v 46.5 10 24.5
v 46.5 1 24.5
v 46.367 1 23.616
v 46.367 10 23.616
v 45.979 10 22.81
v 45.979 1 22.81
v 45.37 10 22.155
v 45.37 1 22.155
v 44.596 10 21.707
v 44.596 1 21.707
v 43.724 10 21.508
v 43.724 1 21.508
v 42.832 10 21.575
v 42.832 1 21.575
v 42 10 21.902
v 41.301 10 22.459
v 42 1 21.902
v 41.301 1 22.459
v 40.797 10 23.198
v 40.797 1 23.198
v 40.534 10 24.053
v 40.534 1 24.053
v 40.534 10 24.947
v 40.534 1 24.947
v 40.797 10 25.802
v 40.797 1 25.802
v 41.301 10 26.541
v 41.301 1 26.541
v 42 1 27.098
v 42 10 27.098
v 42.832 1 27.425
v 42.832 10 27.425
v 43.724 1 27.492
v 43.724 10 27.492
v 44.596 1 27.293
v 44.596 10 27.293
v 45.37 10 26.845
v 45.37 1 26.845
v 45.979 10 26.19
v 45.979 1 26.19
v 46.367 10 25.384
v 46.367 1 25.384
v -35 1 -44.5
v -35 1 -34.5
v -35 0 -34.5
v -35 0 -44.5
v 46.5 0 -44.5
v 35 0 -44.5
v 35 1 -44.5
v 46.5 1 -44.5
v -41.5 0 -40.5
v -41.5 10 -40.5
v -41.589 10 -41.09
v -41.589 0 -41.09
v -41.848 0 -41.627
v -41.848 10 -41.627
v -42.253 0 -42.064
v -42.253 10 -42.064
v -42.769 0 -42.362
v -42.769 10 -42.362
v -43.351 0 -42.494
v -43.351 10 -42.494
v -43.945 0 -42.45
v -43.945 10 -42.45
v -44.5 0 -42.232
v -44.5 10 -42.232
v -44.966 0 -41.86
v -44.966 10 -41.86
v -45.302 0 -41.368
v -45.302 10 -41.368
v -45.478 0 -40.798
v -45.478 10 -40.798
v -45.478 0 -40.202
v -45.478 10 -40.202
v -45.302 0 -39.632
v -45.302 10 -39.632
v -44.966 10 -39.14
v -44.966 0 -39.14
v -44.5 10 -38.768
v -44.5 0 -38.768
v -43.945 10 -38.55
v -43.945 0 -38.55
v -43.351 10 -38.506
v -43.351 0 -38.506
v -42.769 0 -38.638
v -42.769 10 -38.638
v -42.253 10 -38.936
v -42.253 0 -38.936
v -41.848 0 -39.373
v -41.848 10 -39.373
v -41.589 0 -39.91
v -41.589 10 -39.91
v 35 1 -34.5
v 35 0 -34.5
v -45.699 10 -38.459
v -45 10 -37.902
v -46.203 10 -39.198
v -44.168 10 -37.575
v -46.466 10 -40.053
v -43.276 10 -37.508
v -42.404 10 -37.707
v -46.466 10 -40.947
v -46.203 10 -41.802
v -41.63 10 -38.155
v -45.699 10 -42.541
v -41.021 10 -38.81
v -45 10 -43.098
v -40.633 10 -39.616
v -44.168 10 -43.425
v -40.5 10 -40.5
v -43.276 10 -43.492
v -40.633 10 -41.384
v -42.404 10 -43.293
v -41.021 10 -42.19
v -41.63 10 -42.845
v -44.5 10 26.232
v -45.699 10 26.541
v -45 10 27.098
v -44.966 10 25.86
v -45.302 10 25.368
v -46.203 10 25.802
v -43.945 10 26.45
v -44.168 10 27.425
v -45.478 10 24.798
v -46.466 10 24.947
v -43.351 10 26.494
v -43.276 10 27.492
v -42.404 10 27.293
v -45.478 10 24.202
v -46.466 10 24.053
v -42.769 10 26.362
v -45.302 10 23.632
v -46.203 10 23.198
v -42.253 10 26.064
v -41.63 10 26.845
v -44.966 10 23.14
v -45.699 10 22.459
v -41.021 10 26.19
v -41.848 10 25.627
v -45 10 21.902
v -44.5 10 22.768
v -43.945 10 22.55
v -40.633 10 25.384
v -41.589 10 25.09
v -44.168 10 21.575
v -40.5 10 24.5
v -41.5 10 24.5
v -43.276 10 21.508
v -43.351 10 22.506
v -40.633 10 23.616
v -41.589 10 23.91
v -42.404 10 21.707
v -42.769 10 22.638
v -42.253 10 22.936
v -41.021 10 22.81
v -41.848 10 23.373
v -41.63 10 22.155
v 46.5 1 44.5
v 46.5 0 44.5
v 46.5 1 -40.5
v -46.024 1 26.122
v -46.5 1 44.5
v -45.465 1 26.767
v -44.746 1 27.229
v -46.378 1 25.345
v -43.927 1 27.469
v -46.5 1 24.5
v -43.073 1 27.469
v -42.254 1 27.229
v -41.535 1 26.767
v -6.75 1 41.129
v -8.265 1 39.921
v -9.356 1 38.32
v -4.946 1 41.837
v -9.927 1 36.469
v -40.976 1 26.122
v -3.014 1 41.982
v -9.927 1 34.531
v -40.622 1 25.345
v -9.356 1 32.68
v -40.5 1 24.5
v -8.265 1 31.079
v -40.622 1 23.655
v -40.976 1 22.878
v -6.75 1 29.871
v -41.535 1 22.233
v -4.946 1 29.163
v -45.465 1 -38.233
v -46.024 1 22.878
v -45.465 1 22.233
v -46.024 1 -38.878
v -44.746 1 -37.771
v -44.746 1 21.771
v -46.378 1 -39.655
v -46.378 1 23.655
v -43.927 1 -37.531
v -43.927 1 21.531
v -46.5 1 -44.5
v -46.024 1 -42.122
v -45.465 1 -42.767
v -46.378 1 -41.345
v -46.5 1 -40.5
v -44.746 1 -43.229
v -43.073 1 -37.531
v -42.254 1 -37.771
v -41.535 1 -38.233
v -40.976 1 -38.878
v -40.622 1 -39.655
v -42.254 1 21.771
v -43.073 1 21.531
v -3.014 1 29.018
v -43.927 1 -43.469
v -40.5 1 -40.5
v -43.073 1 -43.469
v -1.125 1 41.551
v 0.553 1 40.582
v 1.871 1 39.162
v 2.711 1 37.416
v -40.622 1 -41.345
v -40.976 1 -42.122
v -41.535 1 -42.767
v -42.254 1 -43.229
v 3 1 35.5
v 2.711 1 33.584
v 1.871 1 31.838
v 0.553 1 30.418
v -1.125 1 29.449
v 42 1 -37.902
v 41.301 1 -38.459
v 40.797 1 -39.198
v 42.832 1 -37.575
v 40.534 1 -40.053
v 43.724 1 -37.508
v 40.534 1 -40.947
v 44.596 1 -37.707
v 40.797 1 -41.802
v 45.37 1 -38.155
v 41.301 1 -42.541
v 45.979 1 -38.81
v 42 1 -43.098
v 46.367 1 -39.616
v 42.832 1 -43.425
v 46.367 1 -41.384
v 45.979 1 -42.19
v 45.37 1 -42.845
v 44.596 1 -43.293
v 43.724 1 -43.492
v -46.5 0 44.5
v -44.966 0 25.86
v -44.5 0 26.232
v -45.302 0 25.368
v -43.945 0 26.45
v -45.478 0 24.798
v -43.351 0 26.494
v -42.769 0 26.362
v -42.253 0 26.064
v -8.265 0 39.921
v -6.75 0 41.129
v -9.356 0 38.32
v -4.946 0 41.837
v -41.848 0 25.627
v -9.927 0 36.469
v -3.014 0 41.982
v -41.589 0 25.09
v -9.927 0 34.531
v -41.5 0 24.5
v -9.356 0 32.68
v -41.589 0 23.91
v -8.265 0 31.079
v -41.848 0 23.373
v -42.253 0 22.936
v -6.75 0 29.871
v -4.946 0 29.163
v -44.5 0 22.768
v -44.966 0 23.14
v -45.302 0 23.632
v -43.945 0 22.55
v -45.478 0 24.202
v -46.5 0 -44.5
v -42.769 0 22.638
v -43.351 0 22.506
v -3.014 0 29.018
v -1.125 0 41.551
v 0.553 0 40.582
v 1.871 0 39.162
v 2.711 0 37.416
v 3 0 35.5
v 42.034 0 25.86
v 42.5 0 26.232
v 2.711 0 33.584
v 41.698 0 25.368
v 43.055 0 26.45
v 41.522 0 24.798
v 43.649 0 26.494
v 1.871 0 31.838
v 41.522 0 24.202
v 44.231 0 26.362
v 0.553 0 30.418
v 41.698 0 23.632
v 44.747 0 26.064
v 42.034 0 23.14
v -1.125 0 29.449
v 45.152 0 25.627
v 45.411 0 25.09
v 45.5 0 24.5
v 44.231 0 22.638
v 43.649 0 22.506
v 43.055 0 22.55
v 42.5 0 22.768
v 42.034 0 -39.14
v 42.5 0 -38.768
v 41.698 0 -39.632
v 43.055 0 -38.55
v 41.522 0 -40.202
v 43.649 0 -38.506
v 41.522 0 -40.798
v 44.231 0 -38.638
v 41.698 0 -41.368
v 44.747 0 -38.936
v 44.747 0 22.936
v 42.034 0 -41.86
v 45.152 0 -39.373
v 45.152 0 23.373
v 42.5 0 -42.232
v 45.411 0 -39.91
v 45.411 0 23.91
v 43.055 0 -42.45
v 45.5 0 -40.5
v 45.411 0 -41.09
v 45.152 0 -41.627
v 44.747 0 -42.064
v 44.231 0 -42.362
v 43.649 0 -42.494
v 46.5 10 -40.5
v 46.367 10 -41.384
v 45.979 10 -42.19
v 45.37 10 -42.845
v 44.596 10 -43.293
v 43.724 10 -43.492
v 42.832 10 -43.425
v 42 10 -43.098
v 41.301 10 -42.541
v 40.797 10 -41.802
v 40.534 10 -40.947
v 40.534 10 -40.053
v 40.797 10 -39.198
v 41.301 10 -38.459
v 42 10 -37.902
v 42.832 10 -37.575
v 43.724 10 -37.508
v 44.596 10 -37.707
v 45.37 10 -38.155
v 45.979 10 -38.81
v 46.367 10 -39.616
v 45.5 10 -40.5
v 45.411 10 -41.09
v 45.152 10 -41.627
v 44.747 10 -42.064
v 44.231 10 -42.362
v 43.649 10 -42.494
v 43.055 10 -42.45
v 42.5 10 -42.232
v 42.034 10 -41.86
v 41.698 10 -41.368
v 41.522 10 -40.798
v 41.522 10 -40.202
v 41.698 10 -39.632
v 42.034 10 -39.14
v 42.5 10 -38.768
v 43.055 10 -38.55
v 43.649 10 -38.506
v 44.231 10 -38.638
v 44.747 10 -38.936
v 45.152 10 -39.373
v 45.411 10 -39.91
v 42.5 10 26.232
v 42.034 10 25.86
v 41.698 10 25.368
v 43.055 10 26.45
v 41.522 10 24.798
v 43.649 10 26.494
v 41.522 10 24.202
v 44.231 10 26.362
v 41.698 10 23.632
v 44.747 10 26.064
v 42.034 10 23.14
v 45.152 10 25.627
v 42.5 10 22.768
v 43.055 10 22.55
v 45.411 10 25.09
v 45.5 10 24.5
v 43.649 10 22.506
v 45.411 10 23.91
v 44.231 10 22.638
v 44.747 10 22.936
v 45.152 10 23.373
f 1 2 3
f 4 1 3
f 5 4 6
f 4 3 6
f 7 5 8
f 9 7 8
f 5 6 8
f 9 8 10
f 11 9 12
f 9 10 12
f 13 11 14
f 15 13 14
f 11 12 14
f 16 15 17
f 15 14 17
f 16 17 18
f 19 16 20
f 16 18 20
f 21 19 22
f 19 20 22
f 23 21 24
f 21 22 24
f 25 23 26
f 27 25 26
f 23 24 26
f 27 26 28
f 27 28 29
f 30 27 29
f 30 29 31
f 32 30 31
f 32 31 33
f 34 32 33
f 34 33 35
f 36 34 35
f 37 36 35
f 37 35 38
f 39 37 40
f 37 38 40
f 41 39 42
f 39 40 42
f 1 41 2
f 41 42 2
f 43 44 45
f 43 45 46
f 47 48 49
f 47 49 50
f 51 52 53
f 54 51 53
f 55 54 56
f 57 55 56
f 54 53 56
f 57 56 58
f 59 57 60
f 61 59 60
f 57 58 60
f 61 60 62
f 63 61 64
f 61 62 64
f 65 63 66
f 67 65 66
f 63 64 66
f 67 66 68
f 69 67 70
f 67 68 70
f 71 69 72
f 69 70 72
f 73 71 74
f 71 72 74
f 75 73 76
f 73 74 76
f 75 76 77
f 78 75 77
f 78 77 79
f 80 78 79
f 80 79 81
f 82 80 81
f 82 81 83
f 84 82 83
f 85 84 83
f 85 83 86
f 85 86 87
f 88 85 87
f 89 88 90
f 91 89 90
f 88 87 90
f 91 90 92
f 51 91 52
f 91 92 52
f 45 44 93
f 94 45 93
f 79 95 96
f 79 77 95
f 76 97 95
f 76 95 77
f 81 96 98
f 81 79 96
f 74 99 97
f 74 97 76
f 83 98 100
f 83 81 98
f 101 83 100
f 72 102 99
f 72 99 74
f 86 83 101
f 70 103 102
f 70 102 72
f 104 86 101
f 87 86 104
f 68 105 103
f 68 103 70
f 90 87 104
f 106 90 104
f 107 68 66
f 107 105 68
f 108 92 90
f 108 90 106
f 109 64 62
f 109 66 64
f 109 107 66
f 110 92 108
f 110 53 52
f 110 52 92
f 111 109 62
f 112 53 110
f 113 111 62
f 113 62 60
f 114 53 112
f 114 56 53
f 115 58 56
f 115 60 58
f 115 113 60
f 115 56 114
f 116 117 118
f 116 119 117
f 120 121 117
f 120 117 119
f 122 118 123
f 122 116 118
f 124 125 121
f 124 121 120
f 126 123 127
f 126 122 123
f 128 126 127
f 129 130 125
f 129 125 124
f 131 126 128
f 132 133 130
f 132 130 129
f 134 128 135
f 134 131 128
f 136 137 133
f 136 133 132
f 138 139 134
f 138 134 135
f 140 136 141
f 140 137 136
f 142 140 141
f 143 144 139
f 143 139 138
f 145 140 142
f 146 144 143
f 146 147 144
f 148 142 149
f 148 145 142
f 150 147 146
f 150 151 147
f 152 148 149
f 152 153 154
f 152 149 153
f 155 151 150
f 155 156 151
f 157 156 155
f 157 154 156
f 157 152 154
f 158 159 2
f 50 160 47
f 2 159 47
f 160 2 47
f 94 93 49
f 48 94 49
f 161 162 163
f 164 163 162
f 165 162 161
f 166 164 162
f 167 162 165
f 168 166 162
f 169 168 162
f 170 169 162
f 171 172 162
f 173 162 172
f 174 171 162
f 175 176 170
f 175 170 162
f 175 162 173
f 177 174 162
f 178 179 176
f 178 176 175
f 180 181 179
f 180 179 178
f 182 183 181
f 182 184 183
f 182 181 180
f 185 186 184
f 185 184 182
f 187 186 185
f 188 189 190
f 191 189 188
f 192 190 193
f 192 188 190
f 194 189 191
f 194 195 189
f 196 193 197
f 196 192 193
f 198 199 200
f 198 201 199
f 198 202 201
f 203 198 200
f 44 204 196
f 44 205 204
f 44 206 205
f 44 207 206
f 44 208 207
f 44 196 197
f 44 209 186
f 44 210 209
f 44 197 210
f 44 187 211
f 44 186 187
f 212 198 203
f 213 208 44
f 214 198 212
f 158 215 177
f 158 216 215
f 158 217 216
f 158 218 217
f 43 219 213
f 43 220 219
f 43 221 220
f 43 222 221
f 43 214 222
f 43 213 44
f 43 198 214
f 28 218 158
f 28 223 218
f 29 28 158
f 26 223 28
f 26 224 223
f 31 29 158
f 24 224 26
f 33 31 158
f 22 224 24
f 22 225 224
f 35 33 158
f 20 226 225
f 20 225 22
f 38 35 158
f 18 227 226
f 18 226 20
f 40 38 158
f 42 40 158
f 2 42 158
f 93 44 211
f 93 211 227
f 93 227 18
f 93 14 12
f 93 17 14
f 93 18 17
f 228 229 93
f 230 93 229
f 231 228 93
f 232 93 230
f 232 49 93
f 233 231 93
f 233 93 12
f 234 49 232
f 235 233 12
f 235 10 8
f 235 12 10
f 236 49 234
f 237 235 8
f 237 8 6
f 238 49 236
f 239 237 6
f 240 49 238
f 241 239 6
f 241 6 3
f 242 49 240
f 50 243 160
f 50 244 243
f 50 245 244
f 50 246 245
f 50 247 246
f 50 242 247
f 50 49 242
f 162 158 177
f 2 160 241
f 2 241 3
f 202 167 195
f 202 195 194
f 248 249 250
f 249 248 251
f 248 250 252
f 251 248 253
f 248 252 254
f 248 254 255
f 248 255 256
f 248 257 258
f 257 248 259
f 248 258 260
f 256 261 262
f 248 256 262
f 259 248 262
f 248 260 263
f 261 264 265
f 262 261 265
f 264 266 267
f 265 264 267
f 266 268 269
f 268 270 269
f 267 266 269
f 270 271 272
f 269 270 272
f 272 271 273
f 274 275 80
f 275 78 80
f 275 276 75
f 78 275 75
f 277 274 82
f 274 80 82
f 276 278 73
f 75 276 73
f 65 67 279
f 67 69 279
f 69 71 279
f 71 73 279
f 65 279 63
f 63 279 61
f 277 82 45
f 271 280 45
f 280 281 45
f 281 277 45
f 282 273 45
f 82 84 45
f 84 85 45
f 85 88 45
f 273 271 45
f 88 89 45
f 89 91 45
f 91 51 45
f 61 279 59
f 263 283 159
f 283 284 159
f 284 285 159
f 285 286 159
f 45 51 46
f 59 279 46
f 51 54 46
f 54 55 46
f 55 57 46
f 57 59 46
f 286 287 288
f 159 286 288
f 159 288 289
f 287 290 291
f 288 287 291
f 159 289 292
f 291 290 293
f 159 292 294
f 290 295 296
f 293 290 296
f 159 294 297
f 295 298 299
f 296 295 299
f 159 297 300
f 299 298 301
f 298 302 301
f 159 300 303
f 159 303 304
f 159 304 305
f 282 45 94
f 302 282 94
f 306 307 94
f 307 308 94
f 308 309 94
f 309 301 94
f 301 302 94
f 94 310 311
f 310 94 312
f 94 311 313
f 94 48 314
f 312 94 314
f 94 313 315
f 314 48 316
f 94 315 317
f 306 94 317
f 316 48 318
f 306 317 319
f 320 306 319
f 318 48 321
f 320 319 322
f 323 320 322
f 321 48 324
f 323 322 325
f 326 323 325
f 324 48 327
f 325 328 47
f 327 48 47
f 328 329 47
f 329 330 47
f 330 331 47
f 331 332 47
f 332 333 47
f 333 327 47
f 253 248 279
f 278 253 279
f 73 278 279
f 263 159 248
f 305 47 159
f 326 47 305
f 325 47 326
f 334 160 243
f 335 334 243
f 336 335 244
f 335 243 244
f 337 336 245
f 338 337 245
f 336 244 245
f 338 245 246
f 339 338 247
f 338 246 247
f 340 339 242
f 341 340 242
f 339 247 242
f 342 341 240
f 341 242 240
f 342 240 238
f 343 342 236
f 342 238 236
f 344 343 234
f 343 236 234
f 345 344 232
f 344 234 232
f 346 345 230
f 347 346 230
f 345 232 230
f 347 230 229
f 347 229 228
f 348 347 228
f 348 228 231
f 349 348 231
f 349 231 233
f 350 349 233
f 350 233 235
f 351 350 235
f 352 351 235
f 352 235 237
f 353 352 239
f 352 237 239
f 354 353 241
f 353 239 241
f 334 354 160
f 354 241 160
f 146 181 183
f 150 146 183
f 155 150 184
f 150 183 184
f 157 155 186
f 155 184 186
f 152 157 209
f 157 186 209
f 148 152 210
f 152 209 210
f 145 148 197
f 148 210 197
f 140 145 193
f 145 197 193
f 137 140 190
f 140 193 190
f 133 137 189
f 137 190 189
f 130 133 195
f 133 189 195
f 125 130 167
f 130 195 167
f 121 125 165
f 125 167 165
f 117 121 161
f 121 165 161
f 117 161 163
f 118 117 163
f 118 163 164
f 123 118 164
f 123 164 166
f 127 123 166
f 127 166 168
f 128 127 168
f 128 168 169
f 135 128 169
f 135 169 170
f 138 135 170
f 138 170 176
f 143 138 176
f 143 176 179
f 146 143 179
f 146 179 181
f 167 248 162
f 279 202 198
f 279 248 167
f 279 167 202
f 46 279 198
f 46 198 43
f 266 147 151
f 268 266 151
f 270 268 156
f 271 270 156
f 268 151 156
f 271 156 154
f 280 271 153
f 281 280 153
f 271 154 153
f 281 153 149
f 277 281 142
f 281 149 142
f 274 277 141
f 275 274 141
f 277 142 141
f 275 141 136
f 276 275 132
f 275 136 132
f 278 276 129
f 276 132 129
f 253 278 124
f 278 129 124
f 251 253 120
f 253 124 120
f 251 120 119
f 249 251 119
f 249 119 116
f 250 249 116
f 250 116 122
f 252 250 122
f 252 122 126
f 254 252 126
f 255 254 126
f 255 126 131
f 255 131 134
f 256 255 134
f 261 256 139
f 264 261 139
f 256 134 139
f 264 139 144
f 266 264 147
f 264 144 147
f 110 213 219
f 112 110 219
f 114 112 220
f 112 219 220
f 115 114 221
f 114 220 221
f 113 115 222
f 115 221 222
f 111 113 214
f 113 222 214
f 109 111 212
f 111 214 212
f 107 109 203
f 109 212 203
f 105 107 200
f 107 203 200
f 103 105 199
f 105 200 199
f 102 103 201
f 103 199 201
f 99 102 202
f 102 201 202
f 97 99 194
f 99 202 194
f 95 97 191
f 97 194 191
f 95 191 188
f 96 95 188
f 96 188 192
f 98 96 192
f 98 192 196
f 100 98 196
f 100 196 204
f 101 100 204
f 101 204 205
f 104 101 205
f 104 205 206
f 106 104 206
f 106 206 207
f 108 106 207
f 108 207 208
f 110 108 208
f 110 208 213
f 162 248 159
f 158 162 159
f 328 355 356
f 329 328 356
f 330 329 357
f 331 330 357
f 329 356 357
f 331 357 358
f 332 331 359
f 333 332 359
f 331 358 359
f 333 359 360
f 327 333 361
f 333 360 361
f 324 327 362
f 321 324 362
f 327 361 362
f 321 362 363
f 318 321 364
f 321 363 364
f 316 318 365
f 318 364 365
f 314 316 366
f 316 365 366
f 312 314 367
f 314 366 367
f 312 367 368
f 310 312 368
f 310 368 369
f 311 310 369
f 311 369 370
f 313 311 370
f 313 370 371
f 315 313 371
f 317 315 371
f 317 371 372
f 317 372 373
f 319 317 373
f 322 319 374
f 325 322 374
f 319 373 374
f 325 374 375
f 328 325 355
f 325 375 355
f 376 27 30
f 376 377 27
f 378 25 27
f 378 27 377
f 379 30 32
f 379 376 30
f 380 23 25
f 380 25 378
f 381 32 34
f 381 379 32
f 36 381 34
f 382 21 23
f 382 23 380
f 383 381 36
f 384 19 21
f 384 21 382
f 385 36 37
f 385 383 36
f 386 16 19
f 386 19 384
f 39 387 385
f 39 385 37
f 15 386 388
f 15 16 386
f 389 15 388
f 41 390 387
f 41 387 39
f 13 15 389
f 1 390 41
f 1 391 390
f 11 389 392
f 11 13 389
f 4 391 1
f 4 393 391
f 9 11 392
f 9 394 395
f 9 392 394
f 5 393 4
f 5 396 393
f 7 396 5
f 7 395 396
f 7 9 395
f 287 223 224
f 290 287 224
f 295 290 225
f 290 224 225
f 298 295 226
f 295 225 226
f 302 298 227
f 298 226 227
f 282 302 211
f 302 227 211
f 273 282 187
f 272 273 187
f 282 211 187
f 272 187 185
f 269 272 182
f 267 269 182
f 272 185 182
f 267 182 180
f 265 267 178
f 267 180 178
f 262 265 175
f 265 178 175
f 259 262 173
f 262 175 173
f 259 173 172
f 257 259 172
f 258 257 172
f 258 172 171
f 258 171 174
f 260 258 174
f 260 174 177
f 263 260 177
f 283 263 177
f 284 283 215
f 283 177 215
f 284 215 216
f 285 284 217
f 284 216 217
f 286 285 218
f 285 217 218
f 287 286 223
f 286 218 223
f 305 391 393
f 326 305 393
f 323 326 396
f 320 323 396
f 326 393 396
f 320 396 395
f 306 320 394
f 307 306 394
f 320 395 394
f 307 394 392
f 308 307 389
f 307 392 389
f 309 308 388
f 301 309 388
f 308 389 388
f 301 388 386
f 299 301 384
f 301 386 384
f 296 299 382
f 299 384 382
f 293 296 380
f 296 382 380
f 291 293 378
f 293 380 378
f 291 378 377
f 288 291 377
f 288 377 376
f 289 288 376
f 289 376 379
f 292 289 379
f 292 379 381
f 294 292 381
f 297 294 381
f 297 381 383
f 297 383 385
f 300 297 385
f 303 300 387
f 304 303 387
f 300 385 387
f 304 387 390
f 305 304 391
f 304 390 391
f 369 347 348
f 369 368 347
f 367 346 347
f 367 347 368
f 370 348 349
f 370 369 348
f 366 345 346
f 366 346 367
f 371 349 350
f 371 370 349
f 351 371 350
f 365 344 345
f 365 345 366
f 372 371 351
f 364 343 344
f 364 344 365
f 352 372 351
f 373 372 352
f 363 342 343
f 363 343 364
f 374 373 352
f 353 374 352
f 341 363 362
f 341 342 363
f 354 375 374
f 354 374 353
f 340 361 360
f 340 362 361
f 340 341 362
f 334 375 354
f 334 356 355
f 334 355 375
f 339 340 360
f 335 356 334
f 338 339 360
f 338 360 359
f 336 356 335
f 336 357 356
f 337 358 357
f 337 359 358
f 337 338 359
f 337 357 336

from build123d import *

# Parameters (mm, degrees)
SKETCH1_W           = 93
SKETCH1_H           = 89
BOSS_EXTRUDE1_DEPTH = 1
SKETCH2_R           = 3
BOSS_EXTRUDE2_DEPTH = 9
SKETCH3_R           = 6.5
SKETCH3_W           = 70
SKETCH3_H           = 10
CUT_EXTRUDE4_DEPTH  = 1
SKETCH4_R           = 2
CUT_EXTRUDE5_DEPTH  = 10


with BuildPart() as part:
    # Sketch1 → Boss-Extrude1 (new body)
    with BuildSketch(Plane(origin=(0, 0, 0), x_dir=(1, 0, 0), z_dir=(0, 1, 0))):
        Rectangle(SKETCH1_W, SKETCH1_H)
    extrude(amount=BOSS_EXTRUDE1_DEPTH)

    # Sketch2 → Boss-Extrude2 (add)
    with BuildSketch(Plane(origin=(0, 1, 0), x_dir=(1, 0, 0), z_dir=(0, 1, 0))):
        with Locations((-43.5, 40.5)):
            Circle(SKETCH2_R)
        with Locations((43.5, 40.5)):
            Circle(SKETCH2_R)
        with Locations((-43.5, -24.5)):
            Circle(SKETCH2_R)
        with Locations((43.5, -24.5)):
            Circle(SKETCH2_R)
    extrude(amount=BOSS_EXTRUDE2_DEPTH)

    # Sketch3 → Cut-Extrude4 (cut)
    with BuildSketch(Plane(origin=(0, 1, 0), x_dir=(1, 0, 0), z_dir=(0, 1, 0))):
        with Locations((-3.5, -35.5)):
            Circle(SKETCH3_R)
        with Locations((0, 39.5)):
            Rectangle(SKETCH3_W, SKETCH3_H)
    extrude(amount=-CUT_EXTRUDE4_DEPTH, mode=Mode.SUBTRACT)

    # Sketch4 → Cut-Extrude5 (cut)
    with BuildSketch(Plane(origin=(0, 10, 0), x_dir=(1, 0, 0), z_dir=(0, 1, 0))):
        with Locations((-43.5, 40.5)):
            Circle(SKETCH4_R)
        with Locations((-43.5, -24.5)):
            Circle(SKETCH4_R)
        with Locations((43.5, 40.5)):
            Circle(SKETCH4_R)
        with Locations((43.5, -24.5)):
            Circle(SKETCH4_R)
    extrude(amount=-CUT_EXTRUDE5_DEPTH, mode=Mode.SUBTRACT)


solid = part.part
